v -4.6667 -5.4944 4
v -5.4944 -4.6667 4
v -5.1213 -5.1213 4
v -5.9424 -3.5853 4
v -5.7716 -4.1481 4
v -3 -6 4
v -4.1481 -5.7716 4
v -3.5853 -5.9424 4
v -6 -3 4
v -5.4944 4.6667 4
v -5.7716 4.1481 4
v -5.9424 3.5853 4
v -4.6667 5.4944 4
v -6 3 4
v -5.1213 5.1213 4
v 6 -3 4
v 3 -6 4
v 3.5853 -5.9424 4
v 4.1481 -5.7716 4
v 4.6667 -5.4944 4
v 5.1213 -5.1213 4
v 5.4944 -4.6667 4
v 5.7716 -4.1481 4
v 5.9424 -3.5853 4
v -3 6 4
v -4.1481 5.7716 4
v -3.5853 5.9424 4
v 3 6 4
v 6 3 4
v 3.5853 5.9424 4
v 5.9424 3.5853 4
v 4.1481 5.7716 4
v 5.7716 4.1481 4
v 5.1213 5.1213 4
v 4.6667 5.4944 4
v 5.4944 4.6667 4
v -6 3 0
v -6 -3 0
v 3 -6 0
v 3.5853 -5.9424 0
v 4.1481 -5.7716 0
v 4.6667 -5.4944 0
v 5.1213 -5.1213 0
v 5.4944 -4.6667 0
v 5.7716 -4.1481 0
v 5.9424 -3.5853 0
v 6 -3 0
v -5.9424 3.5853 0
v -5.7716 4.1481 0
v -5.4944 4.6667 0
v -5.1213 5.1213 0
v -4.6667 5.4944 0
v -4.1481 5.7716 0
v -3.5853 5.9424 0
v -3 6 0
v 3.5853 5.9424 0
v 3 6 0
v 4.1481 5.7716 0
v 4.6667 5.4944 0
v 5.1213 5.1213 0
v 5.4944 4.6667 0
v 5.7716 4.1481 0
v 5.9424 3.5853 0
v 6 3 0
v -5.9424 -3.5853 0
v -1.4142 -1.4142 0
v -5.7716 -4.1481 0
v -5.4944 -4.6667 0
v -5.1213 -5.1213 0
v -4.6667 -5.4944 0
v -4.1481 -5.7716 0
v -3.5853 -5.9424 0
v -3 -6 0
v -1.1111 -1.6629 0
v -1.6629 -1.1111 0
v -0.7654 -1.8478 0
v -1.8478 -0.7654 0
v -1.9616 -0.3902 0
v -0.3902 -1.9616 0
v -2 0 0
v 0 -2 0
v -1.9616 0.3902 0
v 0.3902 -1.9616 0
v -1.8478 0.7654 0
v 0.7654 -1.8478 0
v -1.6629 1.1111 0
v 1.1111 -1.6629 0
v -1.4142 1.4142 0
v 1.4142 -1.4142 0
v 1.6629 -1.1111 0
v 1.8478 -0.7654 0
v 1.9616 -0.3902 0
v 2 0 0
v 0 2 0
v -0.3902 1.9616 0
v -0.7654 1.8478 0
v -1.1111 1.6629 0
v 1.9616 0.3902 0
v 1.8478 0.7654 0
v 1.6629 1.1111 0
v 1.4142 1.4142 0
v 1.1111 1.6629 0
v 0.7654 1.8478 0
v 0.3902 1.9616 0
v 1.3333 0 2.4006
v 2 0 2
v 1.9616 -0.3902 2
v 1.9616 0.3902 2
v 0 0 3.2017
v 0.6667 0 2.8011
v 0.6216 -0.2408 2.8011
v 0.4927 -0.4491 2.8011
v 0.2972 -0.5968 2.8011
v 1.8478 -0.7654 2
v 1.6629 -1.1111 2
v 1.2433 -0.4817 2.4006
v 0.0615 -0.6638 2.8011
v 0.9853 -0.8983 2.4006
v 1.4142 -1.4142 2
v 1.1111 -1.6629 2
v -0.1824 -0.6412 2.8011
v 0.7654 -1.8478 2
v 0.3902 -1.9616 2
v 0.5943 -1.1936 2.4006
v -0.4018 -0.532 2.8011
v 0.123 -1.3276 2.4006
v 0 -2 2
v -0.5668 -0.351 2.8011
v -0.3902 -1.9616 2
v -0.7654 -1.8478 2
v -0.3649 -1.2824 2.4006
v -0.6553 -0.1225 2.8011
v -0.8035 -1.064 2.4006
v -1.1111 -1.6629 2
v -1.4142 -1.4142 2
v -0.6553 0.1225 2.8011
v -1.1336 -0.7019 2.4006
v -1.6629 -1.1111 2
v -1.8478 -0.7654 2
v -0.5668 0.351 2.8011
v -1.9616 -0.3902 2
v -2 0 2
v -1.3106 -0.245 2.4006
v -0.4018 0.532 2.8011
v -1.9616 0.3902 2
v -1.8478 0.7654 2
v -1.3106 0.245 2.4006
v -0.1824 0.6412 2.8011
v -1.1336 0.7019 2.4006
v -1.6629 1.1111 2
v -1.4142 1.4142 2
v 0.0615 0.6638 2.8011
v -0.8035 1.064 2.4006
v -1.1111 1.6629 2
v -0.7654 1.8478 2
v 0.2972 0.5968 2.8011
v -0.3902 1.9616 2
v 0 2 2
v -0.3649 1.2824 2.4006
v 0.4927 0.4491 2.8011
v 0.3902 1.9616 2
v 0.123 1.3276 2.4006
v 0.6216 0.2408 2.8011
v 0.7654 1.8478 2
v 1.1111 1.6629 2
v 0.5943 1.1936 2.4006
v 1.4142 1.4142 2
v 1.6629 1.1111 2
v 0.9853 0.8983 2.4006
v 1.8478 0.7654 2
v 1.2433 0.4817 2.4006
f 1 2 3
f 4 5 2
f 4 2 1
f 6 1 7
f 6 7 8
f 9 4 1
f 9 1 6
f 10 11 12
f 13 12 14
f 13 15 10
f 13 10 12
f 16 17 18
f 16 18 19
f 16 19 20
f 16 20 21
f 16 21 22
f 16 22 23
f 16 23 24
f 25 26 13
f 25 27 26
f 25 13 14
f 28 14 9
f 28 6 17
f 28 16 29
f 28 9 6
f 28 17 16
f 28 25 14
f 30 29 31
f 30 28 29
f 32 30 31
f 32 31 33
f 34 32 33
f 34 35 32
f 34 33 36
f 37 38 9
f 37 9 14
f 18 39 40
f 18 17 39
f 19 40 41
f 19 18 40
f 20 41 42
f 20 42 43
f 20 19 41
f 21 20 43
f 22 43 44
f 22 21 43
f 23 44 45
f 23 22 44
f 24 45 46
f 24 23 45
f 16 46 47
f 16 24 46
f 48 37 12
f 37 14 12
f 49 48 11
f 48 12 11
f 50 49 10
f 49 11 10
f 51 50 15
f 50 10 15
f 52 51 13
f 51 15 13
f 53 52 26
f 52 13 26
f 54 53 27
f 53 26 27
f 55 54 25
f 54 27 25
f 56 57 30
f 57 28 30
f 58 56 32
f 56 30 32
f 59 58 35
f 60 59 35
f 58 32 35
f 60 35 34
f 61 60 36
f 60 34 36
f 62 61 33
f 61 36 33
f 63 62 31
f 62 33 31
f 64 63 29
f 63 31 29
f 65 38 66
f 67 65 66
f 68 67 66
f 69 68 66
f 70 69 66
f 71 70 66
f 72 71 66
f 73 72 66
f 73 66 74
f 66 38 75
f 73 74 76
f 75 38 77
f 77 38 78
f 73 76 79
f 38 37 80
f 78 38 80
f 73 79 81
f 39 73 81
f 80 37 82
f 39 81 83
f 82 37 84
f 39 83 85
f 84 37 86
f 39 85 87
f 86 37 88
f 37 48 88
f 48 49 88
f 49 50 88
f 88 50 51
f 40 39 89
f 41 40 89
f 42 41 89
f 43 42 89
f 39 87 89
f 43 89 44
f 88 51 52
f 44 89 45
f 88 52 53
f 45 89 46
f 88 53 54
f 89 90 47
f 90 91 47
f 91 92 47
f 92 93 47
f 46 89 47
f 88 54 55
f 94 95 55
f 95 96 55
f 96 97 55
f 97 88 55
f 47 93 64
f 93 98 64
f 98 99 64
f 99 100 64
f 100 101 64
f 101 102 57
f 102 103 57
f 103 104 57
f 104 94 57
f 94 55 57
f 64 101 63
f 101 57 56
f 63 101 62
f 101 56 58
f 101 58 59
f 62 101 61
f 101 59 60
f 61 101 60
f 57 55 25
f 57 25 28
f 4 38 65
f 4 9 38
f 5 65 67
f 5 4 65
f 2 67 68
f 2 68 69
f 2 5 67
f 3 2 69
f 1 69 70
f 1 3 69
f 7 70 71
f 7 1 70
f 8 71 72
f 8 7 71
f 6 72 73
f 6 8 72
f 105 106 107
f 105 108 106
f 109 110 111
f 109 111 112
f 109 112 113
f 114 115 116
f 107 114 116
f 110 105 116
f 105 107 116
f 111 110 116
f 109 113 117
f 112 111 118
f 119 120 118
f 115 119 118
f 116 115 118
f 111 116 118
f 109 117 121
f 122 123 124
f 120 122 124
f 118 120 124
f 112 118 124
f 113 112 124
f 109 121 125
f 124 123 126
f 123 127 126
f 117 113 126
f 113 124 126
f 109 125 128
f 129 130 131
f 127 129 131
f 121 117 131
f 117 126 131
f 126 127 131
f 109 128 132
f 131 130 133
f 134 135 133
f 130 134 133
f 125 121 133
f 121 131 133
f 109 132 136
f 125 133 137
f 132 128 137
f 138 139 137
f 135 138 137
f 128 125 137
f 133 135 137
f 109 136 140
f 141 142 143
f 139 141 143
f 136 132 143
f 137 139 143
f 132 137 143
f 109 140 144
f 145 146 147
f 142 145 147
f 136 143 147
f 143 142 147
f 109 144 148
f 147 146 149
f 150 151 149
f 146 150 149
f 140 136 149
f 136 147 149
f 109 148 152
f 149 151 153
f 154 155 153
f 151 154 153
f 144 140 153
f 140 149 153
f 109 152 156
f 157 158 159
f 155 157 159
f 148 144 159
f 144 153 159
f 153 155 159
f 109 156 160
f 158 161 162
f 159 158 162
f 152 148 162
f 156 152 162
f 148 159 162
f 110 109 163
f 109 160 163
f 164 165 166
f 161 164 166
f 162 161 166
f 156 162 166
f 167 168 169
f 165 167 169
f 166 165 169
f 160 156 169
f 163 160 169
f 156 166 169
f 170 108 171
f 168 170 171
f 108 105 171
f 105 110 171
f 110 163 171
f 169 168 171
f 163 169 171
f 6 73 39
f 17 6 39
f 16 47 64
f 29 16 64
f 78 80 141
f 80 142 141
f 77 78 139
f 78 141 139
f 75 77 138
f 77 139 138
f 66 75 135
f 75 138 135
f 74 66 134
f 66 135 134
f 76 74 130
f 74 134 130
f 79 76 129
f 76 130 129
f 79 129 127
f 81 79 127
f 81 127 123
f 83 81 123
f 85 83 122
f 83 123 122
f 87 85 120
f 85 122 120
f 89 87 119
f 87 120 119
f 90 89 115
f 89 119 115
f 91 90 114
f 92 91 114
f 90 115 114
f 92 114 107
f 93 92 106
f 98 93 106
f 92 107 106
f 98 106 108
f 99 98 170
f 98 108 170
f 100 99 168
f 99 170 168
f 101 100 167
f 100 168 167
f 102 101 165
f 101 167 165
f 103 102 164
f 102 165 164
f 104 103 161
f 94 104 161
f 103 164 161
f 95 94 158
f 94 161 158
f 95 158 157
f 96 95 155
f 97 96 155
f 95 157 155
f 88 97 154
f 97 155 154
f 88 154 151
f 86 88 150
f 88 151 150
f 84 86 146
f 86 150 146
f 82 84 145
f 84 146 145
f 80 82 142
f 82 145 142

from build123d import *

# Parameters (mm, degrees)
F0_W     = 12
F0_H     = 12
F1_DEPTH = 4
F2_D     = 4
F2_DEPTH = 2
F2_TIP   = 1.2017212381
F3_R     = 3


with BuildPart() as f1:
    # F0 (on Top) → F1 (new body)
    with BuildSketch(Plane.XY):
        Rectangle(F0_W, F0_H)
    extrude(amount=F1_DEPTH)

    # F2
    with Locations(Plane(origin=(0, 0, 0), x_dir=(1, 0, 0), z_dir=(0, 0, -1))):
        with Locations((0, 0)):
            Hole(F2_D / 2, depth=F2_DEPTH)
            with Locations((0, 0, -(F2_DEPTH + F2_TIP / 2))):  # 118° drill point
                Cone(0, F2_D / 2, F2_TIP, mode=Mode.SUBTRACT)

    # F3
    f3_edges = [f1.edges().sort_by_distance(p)[0] for p in [
        (6, 6, 2),
        (-6, 6, 2),
        (-6, -6, 2),
        (6, -6, 2),
    ]]
    fillet(f3_edges, radius=F3_R)


solid = f1.part
